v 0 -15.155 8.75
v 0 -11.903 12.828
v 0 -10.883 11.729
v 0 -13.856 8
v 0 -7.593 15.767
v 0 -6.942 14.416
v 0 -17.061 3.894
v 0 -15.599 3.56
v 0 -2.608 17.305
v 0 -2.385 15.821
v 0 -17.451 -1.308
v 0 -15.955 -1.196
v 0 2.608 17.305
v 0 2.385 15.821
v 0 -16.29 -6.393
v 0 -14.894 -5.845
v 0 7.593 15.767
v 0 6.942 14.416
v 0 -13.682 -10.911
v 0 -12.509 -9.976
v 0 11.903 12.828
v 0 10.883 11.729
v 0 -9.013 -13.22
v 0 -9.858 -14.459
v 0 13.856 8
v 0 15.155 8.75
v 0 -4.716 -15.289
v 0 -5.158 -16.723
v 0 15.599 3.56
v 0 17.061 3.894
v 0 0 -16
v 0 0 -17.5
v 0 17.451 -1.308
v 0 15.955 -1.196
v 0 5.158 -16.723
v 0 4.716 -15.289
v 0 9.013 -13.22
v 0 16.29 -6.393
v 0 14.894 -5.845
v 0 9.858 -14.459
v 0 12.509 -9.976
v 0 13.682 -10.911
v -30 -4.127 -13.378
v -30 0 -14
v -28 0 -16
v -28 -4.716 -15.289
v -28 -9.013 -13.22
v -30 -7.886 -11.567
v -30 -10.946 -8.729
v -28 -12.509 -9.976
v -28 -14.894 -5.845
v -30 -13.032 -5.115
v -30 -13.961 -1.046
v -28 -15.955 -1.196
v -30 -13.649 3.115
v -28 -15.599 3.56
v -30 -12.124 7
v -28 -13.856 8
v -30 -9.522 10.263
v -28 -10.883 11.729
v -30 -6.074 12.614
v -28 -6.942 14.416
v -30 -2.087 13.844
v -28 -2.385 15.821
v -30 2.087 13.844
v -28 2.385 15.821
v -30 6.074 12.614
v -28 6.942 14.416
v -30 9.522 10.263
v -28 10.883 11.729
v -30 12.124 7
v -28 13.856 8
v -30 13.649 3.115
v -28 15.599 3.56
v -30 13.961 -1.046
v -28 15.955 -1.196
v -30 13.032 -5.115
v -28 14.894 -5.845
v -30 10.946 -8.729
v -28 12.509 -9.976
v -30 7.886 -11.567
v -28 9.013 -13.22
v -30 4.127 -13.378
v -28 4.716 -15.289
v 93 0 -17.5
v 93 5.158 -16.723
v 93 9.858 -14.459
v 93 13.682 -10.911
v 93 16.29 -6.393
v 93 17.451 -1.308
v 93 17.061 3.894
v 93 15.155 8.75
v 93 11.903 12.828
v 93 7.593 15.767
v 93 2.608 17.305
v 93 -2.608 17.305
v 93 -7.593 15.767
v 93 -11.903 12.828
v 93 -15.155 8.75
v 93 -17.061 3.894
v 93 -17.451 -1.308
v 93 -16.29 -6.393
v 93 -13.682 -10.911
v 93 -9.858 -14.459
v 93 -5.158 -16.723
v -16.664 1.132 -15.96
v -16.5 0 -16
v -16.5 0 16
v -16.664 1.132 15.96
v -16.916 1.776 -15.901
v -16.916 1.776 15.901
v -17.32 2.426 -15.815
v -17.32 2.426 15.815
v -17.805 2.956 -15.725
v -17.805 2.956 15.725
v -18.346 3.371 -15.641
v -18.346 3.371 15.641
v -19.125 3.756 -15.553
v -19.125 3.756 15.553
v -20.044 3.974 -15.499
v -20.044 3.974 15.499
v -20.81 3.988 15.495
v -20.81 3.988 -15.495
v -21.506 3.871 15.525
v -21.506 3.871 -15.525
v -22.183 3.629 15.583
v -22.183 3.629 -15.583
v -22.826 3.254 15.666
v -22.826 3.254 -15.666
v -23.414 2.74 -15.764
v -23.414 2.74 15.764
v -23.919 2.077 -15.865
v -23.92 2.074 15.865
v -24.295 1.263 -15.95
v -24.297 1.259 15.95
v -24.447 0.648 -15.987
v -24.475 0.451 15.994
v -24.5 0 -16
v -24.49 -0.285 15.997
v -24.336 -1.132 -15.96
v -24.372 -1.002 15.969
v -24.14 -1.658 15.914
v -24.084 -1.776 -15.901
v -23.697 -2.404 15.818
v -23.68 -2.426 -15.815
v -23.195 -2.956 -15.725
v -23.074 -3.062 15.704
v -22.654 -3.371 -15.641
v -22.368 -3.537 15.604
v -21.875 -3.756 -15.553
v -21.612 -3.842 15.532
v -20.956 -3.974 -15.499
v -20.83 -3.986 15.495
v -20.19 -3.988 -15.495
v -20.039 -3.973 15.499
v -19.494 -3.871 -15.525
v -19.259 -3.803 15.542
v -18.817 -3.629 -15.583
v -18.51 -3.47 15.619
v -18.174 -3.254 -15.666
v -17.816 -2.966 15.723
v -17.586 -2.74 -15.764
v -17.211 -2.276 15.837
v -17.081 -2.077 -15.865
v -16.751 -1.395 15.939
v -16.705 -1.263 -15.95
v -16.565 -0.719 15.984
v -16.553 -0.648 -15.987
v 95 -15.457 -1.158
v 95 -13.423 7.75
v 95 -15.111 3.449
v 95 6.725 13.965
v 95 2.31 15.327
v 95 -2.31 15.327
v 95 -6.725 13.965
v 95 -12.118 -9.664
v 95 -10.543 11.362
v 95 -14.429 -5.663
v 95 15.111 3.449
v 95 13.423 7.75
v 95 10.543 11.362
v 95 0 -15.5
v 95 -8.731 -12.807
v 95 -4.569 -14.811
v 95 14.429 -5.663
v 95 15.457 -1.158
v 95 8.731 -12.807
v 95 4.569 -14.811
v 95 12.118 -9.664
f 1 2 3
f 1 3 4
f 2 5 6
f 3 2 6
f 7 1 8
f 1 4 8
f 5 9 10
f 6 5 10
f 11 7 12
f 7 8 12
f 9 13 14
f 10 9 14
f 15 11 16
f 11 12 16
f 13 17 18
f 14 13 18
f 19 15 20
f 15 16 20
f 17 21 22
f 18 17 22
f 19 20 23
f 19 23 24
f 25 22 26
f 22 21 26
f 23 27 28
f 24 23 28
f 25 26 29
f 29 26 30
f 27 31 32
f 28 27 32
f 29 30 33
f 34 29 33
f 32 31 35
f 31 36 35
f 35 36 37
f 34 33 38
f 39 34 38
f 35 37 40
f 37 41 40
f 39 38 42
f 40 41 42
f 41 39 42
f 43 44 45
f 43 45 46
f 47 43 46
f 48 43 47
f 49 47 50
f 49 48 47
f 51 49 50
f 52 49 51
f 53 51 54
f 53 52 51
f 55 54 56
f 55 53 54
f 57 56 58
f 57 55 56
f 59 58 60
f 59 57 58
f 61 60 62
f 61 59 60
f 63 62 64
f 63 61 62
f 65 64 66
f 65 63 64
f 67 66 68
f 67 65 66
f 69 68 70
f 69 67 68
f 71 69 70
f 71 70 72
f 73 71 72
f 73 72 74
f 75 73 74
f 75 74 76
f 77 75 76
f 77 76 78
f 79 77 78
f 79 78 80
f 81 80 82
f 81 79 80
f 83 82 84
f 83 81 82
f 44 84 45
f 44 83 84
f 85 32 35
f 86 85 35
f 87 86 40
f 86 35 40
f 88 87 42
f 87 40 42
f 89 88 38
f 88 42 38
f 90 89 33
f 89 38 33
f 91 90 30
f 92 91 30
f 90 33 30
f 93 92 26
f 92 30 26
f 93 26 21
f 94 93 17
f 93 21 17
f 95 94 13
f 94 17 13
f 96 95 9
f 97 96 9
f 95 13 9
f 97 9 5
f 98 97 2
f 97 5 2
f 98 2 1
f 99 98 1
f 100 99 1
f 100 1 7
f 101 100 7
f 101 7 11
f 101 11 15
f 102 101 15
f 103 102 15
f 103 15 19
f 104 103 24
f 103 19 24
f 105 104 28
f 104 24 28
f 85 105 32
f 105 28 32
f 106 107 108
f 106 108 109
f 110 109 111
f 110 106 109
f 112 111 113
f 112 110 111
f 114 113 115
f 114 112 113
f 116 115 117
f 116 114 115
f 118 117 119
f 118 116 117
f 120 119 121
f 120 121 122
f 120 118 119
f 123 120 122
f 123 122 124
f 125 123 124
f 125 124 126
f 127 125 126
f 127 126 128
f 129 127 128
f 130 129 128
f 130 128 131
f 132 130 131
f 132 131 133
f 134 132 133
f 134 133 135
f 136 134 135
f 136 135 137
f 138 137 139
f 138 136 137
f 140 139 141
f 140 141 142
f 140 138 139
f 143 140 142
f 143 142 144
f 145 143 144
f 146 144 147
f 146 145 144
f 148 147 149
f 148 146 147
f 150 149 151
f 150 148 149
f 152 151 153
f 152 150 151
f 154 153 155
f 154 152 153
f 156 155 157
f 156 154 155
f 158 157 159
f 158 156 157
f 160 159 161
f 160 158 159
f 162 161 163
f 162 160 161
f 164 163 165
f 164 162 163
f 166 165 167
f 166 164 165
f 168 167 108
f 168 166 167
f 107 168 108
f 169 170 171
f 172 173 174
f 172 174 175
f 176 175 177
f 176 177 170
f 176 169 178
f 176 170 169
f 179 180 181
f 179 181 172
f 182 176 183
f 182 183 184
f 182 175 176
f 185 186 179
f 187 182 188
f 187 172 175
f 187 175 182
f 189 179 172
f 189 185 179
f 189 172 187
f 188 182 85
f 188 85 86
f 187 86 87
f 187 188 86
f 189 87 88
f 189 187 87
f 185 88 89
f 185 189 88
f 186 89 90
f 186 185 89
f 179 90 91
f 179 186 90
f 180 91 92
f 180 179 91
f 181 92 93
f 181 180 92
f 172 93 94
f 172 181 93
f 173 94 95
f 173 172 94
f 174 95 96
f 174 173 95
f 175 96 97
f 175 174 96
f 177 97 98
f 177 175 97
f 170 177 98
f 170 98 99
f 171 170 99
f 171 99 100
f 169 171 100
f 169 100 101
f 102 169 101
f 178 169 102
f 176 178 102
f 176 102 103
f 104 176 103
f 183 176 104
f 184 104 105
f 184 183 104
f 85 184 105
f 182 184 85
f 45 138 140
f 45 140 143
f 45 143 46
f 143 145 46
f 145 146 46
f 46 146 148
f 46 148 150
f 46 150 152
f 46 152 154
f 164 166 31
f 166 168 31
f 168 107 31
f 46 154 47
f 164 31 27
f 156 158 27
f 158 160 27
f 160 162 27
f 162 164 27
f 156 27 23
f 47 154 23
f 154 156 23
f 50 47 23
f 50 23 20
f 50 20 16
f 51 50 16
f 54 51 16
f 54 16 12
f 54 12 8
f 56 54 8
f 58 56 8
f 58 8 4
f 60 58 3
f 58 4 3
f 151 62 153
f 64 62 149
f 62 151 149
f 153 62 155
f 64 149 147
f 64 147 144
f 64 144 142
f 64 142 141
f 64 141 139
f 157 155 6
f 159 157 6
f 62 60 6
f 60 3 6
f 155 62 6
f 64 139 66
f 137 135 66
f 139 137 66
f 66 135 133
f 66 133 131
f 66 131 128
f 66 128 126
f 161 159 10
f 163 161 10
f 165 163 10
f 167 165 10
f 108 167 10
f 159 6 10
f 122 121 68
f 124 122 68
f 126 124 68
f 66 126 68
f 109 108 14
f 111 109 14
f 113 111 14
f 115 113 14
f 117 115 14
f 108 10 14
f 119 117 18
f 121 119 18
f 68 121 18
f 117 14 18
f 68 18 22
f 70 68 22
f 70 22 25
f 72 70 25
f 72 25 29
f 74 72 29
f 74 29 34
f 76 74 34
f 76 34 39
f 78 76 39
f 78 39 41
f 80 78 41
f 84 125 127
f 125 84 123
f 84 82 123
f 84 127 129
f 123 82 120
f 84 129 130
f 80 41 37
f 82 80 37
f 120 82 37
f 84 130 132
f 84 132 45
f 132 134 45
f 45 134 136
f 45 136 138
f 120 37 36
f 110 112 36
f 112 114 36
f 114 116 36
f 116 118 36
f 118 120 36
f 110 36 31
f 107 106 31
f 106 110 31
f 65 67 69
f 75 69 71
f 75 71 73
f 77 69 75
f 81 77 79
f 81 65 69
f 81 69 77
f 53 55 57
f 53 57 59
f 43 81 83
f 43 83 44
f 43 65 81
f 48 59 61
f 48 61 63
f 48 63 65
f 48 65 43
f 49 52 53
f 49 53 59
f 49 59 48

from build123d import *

# Parameters (mm, degrees)
SCHIZZO1_R             = 17.5
ESTRUSIONE1_DEPTH      = 95
SCHIZZO2_R             = 16
ESTRUSIONE2_DEPTH      = 30
SMUSSO2_SIZE           = 2
SMUSSO3_SIZE           = 2
ESTRUSIONE6_DEPTH      = 99.17076958
ESTRUSIONE6_DEPTH_BACK = 99.17076958
SCHIZZO5_R             = 4


with BuildPart() as part:
    # Schizzo1 → Estrusione1 (new body)
    with BuildSketch(Plane(origin=(0, 0, 0), x_dir=(0, 0, -1), z_dir=(1, 0, 0))):
        Circle(SCHIZZO1_R)
    extrude(amount=ESTRUSIONE1_DEPTH)

    # Schizzo2 → Estrusione2 (add)
    with BuildSketch(Plane.ZY):
        with Locations(Location((0, 0, 0), (0, 0, 180))):
            Circle(SCHIZZO2_R)
    extrude(amount=ESTRUSIONE2_DEPTH)

    # Smusso2
    smusso2_edges = [part.edges().sort_by_distance(p)[0] for p in [
        (95, 0, 17.5),
    ]]
    chamfer(smusso2_edges, length=SMUSSO2_SIZE)

    # Smusso3
    smusso3_edges = [part.edges().sort_by_distance(p)[0] for p in [
        (-30, 0, 16),
    ]]
    chamfer(smusso3_edges, length=SMUSSO3_SIZE)

    # Schizzo5 → Estrusione6 (cut, two sides: drawn at the far end of the back side and taken through both)
    with BuildSketch(Plane.XY.offset(-ESTRUSIONE6_DEPTH_BACK)):
        with Locations((-20.5, 0)):
            Circle(SCHIZZO5_R)
    extrude(amount=ESTRUSIONE6_DEPTH + ESTRUSIONE6_DEPTH_BACK, mode=Mode.SUBTRACT)


solid = part.part
